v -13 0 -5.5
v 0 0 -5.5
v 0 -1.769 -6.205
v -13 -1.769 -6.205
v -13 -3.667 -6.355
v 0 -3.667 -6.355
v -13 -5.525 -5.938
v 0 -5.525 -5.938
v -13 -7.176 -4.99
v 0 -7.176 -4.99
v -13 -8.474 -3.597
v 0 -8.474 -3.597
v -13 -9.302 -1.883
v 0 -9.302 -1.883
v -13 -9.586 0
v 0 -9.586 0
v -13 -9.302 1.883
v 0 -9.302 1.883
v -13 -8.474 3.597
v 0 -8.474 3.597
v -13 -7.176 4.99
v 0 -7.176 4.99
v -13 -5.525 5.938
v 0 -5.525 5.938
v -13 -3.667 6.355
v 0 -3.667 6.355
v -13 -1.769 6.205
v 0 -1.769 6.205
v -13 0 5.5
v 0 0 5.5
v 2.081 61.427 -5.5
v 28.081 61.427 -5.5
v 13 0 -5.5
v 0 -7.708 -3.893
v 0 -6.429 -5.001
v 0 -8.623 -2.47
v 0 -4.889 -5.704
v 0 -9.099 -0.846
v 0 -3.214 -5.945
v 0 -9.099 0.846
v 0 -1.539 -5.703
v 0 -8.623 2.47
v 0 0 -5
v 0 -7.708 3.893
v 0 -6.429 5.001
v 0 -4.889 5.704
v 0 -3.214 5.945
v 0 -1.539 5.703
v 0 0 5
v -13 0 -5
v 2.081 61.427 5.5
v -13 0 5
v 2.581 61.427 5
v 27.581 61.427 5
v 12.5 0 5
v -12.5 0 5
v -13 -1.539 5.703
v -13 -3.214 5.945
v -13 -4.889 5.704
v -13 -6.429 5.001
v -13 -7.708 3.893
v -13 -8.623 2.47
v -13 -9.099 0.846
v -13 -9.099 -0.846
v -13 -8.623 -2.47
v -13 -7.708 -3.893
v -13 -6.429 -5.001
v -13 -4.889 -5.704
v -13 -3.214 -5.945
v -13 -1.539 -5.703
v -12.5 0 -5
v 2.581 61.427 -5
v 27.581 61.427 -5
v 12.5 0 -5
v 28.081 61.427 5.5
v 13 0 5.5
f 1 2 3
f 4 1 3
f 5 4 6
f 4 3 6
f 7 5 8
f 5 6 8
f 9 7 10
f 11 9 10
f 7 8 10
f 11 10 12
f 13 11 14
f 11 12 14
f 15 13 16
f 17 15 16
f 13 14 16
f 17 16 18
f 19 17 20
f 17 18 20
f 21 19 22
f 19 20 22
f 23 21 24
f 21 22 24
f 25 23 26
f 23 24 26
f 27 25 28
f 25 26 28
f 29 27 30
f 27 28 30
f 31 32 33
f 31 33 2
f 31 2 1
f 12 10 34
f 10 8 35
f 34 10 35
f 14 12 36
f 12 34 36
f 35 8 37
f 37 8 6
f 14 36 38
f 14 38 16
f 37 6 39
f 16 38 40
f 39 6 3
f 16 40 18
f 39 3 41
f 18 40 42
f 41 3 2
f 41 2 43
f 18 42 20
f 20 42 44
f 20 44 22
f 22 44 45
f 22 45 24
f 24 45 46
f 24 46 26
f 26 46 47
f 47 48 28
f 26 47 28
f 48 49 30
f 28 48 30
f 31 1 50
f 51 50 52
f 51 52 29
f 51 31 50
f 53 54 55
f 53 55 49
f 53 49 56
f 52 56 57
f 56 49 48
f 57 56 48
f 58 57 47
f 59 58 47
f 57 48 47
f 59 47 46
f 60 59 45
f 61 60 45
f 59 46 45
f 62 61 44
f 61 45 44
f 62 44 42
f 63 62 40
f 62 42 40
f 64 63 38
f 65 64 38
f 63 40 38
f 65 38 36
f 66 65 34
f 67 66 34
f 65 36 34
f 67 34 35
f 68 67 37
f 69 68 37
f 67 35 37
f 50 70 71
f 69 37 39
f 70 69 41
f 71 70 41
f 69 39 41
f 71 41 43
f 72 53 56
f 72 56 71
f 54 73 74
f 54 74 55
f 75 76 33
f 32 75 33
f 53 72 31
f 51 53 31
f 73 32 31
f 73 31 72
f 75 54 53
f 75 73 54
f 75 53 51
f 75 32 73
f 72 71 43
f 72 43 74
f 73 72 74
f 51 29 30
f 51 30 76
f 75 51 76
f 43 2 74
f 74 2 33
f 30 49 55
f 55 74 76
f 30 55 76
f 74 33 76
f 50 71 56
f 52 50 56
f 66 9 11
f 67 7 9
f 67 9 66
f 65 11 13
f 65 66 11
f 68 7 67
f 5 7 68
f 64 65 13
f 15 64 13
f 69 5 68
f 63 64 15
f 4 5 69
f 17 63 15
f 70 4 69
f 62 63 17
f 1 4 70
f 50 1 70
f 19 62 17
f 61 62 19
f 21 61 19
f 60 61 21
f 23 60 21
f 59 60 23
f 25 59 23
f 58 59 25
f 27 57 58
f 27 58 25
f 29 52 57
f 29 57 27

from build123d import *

# Parameters (mm, degrees)
SKETCH_1_W      = 26
SKETCH_1_H      = 11
SKETCH_1_W_2    = 25
SKETCH_1_H_2    = 10
EXTRUDE_1_DEPTH = 13


with BuildPart() as part:
    # 扫描1: sweep along a path in 草图2
    with BuildLine(Plane.XY) as sweep_1_path:
        Line((0, 0), (15.081446117, 61.427097956))
    # 草图1 → 扫描1 (sweep)
    with BuildSketch(Plane(origin=(0, 0, 0), x_dir=(1, 0, 0), z_dir=(0, 1, 0))):
        Rectangle(SKETCH_1_W, SKETCH_1_H)
        Rectangle(SKETCH_1_W_2, SKETCH_1_H_2, mode=Mode.SUBTRACT)
    sweep(path=sweep_1_path.line)

    # 草图3 → 凸台-拉伸1 (add)
    with BuildSketch(Plane(origin=(0, 0, 0), x_dir=(0, 0, -1), z_dir=(1, 0, 0))):
        with BuildLine():
            Line((-5.5, 0), (-5, 0))
            ThreePointArc((-5, 0), (0, -9.160017332), (5, 0))
            Line((5, 0), (5.5, 0))
            ThreePointArc((5.5, 0), (0, -9.586307333), (-5.5, 0))
        make_face()
    extrude(amount=-EXTRUDE_1_DEPTH)


solid = part.part
